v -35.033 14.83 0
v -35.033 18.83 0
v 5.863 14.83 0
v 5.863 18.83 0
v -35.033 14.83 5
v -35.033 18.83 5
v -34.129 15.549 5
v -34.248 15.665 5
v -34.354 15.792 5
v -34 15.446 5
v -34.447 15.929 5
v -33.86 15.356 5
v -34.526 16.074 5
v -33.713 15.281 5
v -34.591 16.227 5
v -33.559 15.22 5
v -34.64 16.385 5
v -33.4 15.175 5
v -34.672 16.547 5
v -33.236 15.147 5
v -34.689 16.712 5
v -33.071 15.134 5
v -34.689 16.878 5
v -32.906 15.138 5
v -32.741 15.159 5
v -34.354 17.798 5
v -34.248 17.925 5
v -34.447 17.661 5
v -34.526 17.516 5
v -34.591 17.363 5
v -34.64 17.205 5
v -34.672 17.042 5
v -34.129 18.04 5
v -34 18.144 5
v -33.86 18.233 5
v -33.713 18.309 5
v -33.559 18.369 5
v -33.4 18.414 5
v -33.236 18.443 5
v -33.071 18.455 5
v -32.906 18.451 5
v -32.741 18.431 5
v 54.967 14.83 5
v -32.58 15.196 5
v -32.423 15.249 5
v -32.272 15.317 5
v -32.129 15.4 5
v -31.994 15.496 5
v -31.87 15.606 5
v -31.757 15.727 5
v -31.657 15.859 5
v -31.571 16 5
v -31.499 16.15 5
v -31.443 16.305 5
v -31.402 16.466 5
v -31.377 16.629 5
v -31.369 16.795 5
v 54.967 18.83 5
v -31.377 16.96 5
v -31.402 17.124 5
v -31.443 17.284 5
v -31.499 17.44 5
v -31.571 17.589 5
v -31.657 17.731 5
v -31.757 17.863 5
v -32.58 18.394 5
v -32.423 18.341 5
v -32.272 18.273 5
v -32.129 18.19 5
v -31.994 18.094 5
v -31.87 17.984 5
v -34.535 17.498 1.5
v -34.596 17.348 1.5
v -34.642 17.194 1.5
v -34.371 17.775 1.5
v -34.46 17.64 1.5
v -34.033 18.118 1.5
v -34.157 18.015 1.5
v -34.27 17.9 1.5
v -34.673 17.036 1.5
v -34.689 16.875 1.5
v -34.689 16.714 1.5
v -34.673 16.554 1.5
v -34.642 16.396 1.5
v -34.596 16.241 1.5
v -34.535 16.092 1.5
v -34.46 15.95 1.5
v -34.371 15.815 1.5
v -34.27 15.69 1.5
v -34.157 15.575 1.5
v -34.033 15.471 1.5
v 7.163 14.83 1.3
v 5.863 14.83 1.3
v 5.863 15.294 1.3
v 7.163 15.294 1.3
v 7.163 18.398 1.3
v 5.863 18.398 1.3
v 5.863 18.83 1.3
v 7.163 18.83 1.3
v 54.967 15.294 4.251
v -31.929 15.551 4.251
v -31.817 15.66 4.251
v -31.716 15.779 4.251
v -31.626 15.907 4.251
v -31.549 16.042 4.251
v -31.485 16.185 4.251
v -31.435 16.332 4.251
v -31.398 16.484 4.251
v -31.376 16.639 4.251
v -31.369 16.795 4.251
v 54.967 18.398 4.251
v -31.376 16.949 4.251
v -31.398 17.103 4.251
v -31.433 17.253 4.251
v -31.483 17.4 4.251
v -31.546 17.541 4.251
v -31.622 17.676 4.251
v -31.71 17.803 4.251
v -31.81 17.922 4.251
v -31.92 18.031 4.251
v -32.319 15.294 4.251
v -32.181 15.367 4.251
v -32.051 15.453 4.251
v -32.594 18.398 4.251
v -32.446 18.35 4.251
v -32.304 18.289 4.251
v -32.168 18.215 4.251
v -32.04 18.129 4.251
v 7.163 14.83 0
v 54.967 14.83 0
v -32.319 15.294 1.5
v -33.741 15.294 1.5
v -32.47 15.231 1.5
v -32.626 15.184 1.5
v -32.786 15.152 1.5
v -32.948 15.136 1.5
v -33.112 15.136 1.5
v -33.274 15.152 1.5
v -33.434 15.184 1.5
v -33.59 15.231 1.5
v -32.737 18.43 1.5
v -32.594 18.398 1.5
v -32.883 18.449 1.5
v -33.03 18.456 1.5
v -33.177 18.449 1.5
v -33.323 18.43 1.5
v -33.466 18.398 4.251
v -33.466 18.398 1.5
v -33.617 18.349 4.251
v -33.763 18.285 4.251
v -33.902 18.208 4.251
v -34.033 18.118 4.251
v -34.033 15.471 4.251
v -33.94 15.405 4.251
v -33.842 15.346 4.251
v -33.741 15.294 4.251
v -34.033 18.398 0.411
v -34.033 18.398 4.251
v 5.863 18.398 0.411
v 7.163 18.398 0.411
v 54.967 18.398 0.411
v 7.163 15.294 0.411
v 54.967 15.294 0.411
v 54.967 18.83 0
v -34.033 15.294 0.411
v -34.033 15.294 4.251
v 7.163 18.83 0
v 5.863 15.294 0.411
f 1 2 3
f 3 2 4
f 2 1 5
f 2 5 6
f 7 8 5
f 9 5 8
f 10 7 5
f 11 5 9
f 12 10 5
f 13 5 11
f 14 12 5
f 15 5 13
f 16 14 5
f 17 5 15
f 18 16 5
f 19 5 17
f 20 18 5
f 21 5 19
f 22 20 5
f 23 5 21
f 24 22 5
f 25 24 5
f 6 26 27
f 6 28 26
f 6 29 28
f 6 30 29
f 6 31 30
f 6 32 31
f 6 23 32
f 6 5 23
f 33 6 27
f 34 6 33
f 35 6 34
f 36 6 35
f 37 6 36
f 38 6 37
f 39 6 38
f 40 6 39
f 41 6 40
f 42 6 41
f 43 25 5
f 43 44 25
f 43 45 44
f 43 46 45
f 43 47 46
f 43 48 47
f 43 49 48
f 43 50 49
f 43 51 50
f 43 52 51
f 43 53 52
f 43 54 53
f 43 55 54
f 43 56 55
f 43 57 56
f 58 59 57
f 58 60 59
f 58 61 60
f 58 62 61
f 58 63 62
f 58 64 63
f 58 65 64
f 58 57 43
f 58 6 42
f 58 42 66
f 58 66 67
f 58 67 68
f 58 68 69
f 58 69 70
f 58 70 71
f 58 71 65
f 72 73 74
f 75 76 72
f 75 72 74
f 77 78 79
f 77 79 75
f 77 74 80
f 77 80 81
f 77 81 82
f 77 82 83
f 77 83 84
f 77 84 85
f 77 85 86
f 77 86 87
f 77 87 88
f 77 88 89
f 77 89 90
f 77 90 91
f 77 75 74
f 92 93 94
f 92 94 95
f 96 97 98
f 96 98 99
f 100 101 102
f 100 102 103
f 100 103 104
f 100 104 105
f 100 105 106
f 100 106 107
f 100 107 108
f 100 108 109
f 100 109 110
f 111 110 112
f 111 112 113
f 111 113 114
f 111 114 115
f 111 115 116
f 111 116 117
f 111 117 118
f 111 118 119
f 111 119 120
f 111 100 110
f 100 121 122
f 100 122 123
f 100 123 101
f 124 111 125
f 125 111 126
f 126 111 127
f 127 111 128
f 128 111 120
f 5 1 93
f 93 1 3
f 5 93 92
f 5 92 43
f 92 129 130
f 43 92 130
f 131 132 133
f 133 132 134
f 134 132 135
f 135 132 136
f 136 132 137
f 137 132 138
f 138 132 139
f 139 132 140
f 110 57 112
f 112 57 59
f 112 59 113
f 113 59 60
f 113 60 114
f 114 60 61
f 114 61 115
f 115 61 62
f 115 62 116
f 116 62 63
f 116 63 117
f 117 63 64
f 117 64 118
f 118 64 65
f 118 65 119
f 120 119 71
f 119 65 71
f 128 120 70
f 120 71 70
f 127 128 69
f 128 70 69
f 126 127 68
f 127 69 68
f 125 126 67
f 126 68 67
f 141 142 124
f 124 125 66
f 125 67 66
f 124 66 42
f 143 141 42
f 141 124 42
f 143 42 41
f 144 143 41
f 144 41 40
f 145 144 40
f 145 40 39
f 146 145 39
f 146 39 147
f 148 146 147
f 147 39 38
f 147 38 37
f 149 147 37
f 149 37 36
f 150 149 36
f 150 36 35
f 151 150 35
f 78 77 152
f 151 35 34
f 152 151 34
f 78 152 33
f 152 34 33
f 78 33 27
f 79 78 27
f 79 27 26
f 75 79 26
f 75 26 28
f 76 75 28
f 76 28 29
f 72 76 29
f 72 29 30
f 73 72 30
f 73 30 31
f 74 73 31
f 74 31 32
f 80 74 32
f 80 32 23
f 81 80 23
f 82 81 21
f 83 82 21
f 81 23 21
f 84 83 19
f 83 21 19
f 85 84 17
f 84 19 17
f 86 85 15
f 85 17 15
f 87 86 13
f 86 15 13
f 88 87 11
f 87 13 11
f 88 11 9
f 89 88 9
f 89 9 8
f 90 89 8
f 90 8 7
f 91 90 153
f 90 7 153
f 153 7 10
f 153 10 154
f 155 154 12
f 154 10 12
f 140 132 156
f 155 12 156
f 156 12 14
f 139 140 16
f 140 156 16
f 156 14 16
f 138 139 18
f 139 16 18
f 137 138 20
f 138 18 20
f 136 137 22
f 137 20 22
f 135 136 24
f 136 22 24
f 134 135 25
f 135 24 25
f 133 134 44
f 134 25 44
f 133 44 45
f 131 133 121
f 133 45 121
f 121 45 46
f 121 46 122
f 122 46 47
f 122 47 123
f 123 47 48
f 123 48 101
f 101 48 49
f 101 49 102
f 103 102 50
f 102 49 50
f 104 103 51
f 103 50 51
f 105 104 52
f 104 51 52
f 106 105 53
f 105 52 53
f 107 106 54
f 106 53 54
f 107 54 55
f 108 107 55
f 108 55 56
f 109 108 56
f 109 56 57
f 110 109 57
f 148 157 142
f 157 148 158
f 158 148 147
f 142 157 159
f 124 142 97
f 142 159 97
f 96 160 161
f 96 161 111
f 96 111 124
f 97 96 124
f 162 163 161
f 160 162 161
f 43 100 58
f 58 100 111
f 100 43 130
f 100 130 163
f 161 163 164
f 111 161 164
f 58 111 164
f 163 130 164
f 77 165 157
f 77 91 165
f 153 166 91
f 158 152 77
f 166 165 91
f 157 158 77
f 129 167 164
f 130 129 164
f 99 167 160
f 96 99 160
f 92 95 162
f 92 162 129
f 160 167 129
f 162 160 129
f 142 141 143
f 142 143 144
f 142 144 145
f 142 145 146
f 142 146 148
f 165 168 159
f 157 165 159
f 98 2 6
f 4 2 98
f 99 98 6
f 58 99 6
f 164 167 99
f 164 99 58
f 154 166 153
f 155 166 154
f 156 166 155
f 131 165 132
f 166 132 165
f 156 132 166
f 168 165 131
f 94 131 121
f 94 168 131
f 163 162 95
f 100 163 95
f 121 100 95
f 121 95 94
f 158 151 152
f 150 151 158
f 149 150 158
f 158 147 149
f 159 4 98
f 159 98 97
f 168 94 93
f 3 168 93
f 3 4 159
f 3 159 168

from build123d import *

# Parameters (mm, degrees)
F0_W     = 90
F0_H     = 4
F1_DEPTH = 5
F2_R     = 1.661067913
F3_DEPTH = 3.5
F6_W     = 1.3
F6_H     = 4
F7_DEPTH = 1.3
F8_W     = 3.1040143222
F8_H     = 3.8397812168
F9_DEPTH = 89


# Not quite as in the source:
# - the program builds the solid bodies; features that only make, move or delete a surface that nothing else refers to are left out


with BuildPart() as f1:
    # F0 (on Top) → F1 (new body)
    with BuildSketch(Plane.XY):
        with Locations((9.9665279686, 16.8302931339)):
            Rectangle(F0_W, F0_H)
    extrude(amount=F1_DEPTH)

    # F2 (on face) → F3 (cut)
    with BuildSketch(Plane.XY.offset(5)):
        with Locations((-33.0299064517, 16.7948473245)):
            Circle(F2_R)
    extrude(amount=-F3_DEPTH, mode=Mode.SUBTRACT)

    # F6 (on face) → F7 (cut)
    with BuildSketch(Plane(origin=(0, 0, 0), x_dir=(1, 0, 0), z_dir=(0, 0, -1))):
        with Locations((6.5131389402, -16.8302931339)):
            Rectangle(F6_W, F6_H)
    extrude(amount=-F7_DEPTH, mode=Mode.SUBTRACT)

    # F8 (on face) → F9 (cut)
    with BuildSketch(Plane.YZ.offset(54.9665279686)):
        with Locations((16.8456220999, 2.3313869315)):
            Rectangle(F8_W, F8_H)
    extrude(amount=-F9_DEPTH, mode=Mode.SUBTRACT)


solid = f1.part
